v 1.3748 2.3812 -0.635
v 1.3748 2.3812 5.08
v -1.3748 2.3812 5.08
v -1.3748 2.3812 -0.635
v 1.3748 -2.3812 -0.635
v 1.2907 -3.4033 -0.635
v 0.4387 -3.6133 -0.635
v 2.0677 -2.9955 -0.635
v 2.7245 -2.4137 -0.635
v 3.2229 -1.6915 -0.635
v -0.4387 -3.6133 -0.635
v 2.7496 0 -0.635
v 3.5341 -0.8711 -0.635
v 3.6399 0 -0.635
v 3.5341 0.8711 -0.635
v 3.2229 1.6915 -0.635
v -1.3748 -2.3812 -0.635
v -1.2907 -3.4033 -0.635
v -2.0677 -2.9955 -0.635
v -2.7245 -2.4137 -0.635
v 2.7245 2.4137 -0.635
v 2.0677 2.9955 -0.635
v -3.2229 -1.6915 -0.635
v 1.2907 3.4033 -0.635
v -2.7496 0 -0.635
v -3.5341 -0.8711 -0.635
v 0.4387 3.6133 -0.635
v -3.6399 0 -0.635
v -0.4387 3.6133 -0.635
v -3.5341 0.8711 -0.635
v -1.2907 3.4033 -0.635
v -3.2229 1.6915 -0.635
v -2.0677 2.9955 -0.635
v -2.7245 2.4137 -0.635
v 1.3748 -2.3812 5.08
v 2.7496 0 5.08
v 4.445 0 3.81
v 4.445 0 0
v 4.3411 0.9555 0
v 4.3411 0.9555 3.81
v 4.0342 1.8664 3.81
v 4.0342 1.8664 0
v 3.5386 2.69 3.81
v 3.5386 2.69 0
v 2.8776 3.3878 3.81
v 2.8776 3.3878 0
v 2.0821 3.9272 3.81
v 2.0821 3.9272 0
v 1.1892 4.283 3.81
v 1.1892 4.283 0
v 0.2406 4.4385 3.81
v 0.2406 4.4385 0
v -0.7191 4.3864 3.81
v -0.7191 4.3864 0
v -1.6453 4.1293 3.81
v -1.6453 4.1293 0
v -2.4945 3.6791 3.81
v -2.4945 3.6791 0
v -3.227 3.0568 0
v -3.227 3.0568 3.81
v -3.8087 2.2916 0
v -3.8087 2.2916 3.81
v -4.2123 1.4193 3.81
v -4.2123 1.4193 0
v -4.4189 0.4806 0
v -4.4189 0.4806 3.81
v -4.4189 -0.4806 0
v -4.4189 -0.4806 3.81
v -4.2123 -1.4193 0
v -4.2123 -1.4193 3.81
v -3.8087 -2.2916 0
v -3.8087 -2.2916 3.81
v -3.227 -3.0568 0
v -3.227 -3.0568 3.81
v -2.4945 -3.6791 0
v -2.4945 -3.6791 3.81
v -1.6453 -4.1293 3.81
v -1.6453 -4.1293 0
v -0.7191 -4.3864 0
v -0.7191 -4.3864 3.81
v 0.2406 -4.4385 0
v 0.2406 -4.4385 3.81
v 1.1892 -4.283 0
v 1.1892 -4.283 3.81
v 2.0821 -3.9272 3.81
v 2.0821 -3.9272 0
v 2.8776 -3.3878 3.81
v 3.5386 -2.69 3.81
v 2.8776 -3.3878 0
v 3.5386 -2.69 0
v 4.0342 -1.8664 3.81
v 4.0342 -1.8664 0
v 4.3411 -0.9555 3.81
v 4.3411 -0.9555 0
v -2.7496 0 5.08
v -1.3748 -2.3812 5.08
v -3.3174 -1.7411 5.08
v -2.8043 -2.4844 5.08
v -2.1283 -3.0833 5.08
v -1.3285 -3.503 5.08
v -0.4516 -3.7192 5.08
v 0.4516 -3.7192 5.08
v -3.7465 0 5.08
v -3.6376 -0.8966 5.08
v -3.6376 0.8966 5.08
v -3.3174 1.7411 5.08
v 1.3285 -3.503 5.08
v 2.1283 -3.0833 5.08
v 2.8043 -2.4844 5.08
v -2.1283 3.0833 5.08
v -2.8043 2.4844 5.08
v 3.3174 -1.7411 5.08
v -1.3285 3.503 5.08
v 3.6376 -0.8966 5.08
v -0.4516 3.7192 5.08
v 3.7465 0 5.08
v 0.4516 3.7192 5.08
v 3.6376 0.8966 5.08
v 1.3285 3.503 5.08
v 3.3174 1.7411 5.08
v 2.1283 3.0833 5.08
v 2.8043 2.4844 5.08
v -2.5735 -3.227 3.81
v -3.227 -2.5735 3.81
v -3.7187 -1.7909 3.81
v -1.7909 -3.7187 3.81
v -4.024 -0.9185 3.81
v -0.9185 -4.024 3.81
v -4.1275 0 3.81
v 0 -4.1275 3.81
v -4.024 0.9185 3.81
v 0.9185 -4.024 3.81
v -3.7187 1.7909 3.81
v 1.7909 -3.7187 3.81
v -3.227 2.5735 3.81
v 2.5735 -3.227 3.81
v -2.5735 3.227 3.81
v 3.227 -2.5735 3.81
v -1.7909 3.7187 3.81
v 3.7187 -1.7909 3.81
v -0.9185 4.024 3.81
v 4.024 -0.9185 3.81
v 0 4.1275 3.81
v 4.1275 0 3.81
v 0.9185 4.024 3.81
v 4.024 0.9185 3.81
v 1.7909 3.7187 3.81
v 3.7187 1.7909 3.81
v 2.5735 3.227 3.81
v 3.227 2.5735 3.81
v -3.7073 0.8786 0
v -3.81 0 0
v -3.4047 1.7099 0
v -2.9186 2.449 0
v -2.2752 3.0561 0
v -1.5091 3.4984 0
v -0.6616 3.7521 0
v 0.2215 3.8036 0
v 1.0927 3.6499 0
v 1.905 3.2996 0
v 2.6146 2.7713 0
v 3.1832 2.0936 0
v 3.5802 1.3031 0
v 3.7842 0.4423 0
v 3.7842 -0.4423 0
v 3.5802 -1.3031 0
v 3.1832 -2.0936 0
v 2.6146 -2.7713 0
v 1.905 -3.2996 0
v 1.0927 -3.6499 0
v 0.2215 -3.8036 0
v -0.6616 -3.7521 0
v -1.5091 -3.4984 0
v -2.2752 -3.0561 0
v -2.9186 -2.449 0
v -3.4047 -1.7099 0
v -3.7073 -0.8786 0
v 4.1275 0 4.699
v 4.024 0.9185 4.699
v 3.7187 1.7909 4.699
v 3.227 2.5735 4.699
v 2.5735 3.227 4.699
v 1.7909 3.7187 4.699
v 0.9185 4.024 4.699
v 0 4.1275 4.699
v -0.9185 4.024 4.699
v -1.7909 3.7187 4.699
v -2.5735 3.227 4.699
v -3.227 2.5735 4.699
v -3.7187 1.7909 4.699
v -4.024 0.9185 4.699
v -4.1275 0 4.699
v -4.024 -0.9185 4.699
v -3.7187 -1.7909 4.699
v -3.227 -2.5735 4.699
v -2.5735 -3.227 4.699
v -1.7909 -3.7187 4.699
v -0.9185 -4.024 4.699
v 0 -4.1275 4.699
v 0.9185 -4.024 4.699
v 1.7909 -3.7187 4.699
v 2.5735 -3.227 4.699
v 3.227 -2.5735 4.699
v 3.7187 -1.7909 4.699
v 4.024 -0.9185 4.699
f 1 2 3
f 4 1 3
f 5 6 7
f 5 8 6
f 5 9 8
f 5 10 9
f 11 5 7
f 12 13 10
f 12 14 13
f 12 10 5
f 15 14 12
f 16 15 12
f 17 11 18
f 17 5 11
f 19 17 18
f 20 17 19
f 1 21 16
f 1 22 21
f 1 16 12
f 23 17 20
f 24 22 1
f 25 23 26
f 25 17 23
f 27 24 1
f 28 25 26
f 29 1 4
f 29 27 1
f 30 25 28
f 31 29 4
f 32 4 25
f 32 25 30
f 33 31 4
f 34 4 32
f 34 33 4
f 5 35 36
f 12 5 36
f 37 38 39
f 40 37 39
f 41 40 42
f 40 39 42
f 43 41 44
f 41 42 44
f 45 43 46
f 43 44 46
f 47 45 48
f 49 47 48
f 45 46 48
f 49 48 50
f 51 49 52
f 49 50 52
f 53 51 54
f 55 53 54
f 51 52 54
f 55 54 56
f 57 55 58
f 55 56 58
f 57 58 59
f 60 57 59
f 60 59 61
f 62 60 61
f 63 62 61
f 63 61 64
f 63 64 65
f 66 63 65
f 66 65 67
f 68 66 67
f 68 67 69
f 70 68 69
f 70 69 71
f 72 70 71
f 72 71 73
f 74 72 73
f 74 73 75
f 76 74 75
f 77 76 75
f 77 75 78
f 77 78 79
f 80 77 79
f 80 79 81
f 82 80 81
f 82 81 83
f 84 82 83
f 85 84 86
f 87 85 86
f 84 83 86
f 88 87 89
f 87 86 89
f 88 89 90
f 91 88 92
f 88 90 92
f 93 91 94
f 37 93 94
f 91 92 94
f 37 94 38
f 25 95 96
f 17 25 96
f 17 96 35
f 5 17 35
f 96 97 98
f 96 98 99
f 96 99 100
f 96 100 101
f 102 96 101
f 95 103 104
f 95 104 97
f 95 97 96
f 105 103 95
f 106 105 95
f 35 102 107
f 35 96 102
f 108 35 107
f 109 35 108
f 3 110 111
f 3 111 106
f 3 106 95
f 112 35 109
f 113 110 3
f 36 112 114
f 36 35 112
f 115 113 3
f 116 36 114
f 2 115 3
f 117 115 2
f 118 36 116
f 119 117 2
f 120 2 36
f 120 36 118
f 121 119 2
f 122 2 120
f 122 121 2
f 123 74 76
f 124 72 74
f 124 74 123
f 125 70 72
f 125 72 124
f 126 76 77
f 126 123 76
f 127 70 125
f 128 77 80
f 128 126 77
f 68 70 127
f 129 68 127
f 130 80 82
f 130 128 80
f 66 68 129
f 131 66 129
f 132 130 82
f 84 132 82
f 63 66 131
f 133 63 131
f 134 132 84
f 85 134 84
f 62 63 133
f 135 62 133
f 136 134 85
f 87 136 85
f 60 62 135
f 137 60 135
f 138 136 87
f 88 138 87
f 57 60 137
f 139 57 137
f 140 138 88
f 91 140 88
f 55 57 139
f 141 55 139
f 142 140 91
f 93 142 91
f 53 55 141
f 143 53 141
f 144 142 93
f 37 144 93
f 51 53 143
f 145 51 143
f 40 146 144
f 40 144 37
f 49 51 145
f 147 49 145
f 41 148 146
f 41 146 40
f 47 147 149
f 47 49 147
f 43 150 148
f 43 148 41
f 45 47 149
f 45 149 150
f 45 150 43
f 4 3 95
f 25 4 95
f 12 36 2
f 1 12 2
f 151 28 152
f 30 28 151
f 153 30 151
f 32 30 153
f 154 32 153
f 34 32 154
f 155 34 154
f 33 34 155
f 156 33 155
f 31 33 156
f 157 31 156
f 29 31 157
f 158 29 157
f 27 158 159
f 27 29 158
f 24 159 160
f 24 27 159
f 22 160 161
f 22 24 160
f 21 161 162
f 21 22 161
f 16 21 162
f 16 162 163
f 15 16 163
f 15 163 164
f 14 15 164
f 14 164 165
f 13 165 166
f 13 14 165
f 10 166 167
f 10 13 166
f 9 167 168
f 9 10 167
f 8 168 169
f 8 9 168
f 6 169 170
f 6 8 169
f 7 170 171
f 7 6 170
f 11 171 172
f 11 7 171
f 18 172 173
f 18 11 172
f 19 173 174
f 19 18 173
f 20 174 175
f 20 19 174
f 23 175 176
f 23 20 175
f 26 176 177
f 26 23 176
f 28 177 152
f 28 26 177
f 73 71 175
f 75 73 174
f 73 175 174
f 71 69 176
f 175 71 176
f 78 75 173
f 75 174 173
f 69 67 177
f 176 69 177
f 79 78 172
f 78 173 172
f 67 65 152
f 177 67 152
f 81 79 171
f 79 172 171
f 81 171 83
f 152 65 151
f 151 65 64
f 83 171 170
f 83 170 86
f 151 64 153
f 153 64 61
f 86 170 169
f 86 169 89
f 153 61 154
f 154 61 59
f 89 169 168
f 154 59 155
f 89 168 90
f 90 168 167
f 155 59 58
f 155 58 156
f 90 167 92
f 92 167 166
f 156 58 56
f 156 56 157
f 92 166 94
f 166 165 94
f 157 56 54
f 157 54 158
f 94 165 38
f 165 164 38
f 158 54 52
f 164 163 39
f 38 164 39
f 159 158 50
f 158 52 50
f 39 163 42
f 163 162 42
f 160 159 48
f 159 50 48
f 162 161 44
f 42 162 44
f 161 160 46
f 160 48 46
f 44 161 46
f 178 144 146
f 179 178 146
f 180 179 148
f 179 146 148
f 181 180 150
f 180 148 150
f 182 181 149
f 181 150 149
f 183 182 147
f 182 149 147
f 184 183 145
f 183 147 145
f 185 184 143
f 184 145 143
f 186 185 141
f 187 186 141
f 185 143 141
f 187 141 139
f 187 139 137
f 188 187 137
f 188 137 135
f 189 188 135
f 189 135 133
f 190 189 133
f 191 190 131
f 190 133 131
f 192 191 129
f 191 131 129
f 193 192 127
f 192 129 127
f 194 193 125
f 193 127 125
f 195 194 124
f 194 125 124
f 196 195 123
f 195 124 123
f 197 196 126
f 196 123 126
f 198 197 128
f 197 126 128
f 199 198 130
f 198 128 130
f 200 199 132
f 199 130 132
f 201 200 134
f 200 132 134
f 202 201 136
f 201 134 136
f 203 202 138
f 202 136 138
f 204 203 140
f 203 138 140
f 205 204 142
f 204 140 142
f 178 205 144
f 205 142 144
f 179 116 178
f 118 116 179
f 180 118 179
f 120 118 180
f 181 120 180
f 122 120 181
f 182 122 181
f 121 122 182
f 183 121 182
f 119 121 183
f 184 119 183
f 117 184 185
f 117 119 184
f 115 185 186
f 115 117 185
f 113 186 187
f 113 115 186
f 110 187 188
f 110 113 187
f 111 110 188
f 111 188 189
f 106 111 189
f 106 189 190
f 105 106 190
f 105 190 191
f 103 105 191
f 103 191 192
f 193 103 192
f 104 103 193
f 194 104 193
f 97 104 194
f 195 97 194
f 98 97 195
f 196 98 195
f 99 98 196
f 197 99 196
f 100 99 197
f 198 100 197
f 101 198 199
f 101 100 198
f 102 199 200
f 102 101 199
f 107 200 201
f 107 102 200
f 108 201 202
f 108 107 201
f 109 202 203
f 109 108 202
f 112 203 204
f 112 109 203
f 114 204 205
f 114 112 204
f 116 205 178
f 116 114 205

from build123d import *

# Parameters (mm, degrees)
SKETCH1_R           = 4.445
BOSS_EXTRUDE1_DEPTH = 5.08
SKETCH2_R           = 3.81
BOSS_EXTRUDE2_DEPTH = 0.635
BOSS_EXTRUDE2_TAPER = 15
CUT_EXTRUDE1_START  = -1.27
SKETCH3_R           = 4.445
SKETCH3_R_2         = 4.1275
CUT_EXTRUDE1_DEPTH  = 1.27
CHAMFER1_SIZE       = 0.381
CUT_EXTRUDE2_DEPTH  = 9.495721049


with BuildPart() as part:
    # Sketch1 → Boss-Extrude1 (new body)
    with BuildSketch(Plane.XY):
        Circle(SKETCH1_R)
    extrude(amount=BOSS_EXTRUDE1_DEPTH)

    # Sketch2 → Boss-Extrude2 (add)
    with BuildSketch(Plane(origin=(0, 0, 0), x_dir=(-1, 0, 0), z_dir=(0, 0, -1))):
        Circle(SKETCH2_R)
    extrude(amount=BOSS_EXTRUDE2_DEPTH, taper=BOSS_EXTRUDE2_TAPER)

    # Sketch3 → Cut-Extrude1 (cut)
    with BuildSketch(Plane.XY.offset(5.08).offset(CUT_EXTRUDE1_START)):
        Circle(SKETCH3_R)
        Circle(SKETCH3_R_2, mode=Mode.SUBTRACT)
    extrude(amount=CUT_EXTRUDE1_DEPTH, mode=Mode.SUBTRACT)

    # Chamfer1
    chamfer1_edges = [part.edges().sort_by_distance(p)[0] for p in [
        (-4.1275, 0, 5.08),
    ]]
    chamfer(chamfer1_edges, length=CHAMFER1_SIZE)

    # Sketch5 → Cut-Extrude2 (cut, through all)
    with BuildSketch(Plane.XY.offset(5.08)):
        Polygon((-1.374815329, 2.38125), (-2.749630657, 0), (-1.374815329, -2.38125), (1.374815329, -2.38125), (2.749630657, 0), (1.374815329, 2.38125), align=None)
    extrude(amount=-CUT_EXTRUDE2_DEPTH, mode=Mode.SUBTRACT)


solid = part.part
